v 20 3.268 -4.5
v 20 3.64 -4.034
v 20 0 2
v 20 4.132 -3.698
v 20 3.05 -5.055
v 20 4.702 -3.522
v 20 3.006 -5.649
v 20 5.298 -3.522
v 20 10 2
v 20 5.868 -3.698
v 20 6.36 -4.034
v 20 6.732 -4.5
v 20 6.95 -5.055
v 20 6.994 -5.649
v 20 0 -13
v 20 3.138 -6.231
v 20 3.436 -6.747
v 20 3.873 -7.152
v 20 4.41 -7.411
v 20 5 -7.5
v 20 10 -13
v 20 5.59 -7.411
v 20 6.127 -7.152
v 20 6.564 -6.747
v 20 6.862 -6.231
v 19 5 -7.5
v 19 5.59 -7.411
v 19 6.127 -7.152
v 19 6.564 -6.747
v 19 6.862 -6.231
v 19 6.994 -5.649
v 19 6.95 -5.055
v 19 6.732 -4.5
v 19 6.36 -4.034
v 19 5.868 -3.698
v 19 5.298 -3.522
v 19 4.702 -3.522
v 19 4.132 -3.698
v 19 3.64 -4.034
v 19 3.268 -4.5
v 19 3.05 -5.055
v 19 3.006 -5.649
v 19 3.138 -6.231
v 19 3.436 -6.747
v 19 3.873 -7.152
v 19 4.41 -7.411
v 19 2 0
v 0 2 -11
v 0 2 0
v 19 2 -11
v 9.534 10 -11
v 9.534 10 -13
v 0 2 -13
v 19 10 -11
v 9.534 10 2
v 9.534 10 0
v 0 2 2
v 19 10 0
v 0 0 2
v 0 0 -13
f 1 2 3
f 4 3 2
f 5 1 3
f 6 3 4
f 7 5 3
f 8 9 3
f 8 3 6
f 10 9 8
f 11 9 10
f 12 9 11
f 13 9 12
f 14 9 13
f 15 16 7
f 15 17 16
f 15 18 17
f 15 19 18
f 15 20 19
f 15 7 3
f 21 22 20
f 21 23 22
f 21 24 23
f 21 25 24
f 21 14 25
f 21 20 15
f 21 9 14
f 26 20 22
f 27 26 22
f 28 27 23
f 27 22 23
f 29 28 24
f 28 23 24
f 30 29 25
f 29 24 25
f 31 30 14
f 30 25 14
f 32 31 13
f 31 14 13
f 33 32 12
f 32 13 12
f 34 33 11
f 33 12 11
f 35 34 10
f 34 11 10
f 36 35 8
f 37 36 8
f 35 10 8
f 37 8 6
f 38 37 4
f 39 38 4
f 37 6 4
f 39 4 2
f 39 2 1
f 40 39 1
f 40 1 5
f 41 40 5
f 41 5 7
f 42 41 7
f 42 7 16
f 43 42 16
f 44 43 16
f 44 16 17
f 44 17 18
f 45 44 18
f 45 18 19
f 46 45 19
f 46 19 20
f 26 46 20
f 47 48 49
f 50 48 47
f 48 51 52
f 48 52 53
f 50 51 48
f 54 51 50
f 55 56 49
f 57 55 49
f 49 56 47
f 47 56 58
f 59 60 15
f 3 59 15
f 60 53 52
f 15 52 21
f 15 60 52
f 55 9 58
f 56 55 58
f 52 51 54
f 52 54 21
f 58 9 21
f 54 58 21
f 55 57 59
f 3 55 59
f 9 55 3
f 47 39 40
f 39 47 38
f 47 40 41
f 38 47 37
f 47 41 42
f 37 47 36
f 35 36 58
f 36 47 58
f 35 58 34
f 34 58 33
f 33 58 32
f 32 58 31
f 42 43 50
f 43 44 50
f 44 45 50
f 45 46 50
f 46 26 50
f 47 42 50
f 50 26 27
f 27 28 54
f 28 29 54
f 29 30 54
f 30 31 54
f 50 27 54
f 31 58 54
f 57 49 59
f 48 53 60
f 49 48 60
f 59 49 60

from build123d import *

# Parameters (mm, degrees)
SKETCH2_W           = 20
SKETCH2_H           = 13
BOSS_EXTRUDE1_DEPTH = 2
BOSS_EXTRUDE2_DEPTH = 2
SKETCH4_W           = 11
SKETCH4_H           = 8
BOSS_EXTRUDE3_DEPTH = 1
SKETCH5_R           = 2
CUT_EXTRUDE1_DEPTH  = 6


with BuildPart() as part:
    # Sketch2 → Boss-Extrude1 (new body)
    with BuildSketch(Plane(origin=(0, 0, 0), x_dir=(1, 0, 0), z_dir=(0, 1, 0))):
        with Locations((10, 6.5)):
            Rectangle(SKETCH2_W, SKETCH2_H)
    extrude(amount=BOSS_EXTRUDE1_DEPTH)

    # Sketch3 → Boss-Extrude2 (add)
    with BuildSketch(Plane.XY):
        Polygon((0, 0), (20, 0), (20, 10), (9.534028741, 10), (0, 2), align=None)
    boss_extrude2 = extrude(amount=BOSS_EXTRUDE2_DEPTH)

    # Mirror1: Boss-Extrude2 across plane
    add(boss_extrude2.mirror(Plane.XY.offset(-5.5)))

    # Sketch4 → Boss-Extrude3 (add)
    with BuildSketch(Plane(origin=(20, 0, 0), x_dir=(0, 0, -1), z_dir=(1, 0, 0))):
        with Locations((5.5, 6)):
            Rectangle(SKETCH4_W, SKETCH4_H)
    extrude(amount=-BOSS_EXTRUDE3_DEPTH)

    # Sketch5 → Cut-Extrude1 (cut)
    with BuildSketch(Plane(origin=(20, 0, 0), x_dir=(0, 0, -1), z_dir=(1, 0, 0))):
        with Locations((5.5, 5)):
            Circle(SKETCH5_R)
    extrude(amount=-CUT_EXTRUDE1_DEPTH, mode=Mode.SUBTRACT)


solid = part.part
